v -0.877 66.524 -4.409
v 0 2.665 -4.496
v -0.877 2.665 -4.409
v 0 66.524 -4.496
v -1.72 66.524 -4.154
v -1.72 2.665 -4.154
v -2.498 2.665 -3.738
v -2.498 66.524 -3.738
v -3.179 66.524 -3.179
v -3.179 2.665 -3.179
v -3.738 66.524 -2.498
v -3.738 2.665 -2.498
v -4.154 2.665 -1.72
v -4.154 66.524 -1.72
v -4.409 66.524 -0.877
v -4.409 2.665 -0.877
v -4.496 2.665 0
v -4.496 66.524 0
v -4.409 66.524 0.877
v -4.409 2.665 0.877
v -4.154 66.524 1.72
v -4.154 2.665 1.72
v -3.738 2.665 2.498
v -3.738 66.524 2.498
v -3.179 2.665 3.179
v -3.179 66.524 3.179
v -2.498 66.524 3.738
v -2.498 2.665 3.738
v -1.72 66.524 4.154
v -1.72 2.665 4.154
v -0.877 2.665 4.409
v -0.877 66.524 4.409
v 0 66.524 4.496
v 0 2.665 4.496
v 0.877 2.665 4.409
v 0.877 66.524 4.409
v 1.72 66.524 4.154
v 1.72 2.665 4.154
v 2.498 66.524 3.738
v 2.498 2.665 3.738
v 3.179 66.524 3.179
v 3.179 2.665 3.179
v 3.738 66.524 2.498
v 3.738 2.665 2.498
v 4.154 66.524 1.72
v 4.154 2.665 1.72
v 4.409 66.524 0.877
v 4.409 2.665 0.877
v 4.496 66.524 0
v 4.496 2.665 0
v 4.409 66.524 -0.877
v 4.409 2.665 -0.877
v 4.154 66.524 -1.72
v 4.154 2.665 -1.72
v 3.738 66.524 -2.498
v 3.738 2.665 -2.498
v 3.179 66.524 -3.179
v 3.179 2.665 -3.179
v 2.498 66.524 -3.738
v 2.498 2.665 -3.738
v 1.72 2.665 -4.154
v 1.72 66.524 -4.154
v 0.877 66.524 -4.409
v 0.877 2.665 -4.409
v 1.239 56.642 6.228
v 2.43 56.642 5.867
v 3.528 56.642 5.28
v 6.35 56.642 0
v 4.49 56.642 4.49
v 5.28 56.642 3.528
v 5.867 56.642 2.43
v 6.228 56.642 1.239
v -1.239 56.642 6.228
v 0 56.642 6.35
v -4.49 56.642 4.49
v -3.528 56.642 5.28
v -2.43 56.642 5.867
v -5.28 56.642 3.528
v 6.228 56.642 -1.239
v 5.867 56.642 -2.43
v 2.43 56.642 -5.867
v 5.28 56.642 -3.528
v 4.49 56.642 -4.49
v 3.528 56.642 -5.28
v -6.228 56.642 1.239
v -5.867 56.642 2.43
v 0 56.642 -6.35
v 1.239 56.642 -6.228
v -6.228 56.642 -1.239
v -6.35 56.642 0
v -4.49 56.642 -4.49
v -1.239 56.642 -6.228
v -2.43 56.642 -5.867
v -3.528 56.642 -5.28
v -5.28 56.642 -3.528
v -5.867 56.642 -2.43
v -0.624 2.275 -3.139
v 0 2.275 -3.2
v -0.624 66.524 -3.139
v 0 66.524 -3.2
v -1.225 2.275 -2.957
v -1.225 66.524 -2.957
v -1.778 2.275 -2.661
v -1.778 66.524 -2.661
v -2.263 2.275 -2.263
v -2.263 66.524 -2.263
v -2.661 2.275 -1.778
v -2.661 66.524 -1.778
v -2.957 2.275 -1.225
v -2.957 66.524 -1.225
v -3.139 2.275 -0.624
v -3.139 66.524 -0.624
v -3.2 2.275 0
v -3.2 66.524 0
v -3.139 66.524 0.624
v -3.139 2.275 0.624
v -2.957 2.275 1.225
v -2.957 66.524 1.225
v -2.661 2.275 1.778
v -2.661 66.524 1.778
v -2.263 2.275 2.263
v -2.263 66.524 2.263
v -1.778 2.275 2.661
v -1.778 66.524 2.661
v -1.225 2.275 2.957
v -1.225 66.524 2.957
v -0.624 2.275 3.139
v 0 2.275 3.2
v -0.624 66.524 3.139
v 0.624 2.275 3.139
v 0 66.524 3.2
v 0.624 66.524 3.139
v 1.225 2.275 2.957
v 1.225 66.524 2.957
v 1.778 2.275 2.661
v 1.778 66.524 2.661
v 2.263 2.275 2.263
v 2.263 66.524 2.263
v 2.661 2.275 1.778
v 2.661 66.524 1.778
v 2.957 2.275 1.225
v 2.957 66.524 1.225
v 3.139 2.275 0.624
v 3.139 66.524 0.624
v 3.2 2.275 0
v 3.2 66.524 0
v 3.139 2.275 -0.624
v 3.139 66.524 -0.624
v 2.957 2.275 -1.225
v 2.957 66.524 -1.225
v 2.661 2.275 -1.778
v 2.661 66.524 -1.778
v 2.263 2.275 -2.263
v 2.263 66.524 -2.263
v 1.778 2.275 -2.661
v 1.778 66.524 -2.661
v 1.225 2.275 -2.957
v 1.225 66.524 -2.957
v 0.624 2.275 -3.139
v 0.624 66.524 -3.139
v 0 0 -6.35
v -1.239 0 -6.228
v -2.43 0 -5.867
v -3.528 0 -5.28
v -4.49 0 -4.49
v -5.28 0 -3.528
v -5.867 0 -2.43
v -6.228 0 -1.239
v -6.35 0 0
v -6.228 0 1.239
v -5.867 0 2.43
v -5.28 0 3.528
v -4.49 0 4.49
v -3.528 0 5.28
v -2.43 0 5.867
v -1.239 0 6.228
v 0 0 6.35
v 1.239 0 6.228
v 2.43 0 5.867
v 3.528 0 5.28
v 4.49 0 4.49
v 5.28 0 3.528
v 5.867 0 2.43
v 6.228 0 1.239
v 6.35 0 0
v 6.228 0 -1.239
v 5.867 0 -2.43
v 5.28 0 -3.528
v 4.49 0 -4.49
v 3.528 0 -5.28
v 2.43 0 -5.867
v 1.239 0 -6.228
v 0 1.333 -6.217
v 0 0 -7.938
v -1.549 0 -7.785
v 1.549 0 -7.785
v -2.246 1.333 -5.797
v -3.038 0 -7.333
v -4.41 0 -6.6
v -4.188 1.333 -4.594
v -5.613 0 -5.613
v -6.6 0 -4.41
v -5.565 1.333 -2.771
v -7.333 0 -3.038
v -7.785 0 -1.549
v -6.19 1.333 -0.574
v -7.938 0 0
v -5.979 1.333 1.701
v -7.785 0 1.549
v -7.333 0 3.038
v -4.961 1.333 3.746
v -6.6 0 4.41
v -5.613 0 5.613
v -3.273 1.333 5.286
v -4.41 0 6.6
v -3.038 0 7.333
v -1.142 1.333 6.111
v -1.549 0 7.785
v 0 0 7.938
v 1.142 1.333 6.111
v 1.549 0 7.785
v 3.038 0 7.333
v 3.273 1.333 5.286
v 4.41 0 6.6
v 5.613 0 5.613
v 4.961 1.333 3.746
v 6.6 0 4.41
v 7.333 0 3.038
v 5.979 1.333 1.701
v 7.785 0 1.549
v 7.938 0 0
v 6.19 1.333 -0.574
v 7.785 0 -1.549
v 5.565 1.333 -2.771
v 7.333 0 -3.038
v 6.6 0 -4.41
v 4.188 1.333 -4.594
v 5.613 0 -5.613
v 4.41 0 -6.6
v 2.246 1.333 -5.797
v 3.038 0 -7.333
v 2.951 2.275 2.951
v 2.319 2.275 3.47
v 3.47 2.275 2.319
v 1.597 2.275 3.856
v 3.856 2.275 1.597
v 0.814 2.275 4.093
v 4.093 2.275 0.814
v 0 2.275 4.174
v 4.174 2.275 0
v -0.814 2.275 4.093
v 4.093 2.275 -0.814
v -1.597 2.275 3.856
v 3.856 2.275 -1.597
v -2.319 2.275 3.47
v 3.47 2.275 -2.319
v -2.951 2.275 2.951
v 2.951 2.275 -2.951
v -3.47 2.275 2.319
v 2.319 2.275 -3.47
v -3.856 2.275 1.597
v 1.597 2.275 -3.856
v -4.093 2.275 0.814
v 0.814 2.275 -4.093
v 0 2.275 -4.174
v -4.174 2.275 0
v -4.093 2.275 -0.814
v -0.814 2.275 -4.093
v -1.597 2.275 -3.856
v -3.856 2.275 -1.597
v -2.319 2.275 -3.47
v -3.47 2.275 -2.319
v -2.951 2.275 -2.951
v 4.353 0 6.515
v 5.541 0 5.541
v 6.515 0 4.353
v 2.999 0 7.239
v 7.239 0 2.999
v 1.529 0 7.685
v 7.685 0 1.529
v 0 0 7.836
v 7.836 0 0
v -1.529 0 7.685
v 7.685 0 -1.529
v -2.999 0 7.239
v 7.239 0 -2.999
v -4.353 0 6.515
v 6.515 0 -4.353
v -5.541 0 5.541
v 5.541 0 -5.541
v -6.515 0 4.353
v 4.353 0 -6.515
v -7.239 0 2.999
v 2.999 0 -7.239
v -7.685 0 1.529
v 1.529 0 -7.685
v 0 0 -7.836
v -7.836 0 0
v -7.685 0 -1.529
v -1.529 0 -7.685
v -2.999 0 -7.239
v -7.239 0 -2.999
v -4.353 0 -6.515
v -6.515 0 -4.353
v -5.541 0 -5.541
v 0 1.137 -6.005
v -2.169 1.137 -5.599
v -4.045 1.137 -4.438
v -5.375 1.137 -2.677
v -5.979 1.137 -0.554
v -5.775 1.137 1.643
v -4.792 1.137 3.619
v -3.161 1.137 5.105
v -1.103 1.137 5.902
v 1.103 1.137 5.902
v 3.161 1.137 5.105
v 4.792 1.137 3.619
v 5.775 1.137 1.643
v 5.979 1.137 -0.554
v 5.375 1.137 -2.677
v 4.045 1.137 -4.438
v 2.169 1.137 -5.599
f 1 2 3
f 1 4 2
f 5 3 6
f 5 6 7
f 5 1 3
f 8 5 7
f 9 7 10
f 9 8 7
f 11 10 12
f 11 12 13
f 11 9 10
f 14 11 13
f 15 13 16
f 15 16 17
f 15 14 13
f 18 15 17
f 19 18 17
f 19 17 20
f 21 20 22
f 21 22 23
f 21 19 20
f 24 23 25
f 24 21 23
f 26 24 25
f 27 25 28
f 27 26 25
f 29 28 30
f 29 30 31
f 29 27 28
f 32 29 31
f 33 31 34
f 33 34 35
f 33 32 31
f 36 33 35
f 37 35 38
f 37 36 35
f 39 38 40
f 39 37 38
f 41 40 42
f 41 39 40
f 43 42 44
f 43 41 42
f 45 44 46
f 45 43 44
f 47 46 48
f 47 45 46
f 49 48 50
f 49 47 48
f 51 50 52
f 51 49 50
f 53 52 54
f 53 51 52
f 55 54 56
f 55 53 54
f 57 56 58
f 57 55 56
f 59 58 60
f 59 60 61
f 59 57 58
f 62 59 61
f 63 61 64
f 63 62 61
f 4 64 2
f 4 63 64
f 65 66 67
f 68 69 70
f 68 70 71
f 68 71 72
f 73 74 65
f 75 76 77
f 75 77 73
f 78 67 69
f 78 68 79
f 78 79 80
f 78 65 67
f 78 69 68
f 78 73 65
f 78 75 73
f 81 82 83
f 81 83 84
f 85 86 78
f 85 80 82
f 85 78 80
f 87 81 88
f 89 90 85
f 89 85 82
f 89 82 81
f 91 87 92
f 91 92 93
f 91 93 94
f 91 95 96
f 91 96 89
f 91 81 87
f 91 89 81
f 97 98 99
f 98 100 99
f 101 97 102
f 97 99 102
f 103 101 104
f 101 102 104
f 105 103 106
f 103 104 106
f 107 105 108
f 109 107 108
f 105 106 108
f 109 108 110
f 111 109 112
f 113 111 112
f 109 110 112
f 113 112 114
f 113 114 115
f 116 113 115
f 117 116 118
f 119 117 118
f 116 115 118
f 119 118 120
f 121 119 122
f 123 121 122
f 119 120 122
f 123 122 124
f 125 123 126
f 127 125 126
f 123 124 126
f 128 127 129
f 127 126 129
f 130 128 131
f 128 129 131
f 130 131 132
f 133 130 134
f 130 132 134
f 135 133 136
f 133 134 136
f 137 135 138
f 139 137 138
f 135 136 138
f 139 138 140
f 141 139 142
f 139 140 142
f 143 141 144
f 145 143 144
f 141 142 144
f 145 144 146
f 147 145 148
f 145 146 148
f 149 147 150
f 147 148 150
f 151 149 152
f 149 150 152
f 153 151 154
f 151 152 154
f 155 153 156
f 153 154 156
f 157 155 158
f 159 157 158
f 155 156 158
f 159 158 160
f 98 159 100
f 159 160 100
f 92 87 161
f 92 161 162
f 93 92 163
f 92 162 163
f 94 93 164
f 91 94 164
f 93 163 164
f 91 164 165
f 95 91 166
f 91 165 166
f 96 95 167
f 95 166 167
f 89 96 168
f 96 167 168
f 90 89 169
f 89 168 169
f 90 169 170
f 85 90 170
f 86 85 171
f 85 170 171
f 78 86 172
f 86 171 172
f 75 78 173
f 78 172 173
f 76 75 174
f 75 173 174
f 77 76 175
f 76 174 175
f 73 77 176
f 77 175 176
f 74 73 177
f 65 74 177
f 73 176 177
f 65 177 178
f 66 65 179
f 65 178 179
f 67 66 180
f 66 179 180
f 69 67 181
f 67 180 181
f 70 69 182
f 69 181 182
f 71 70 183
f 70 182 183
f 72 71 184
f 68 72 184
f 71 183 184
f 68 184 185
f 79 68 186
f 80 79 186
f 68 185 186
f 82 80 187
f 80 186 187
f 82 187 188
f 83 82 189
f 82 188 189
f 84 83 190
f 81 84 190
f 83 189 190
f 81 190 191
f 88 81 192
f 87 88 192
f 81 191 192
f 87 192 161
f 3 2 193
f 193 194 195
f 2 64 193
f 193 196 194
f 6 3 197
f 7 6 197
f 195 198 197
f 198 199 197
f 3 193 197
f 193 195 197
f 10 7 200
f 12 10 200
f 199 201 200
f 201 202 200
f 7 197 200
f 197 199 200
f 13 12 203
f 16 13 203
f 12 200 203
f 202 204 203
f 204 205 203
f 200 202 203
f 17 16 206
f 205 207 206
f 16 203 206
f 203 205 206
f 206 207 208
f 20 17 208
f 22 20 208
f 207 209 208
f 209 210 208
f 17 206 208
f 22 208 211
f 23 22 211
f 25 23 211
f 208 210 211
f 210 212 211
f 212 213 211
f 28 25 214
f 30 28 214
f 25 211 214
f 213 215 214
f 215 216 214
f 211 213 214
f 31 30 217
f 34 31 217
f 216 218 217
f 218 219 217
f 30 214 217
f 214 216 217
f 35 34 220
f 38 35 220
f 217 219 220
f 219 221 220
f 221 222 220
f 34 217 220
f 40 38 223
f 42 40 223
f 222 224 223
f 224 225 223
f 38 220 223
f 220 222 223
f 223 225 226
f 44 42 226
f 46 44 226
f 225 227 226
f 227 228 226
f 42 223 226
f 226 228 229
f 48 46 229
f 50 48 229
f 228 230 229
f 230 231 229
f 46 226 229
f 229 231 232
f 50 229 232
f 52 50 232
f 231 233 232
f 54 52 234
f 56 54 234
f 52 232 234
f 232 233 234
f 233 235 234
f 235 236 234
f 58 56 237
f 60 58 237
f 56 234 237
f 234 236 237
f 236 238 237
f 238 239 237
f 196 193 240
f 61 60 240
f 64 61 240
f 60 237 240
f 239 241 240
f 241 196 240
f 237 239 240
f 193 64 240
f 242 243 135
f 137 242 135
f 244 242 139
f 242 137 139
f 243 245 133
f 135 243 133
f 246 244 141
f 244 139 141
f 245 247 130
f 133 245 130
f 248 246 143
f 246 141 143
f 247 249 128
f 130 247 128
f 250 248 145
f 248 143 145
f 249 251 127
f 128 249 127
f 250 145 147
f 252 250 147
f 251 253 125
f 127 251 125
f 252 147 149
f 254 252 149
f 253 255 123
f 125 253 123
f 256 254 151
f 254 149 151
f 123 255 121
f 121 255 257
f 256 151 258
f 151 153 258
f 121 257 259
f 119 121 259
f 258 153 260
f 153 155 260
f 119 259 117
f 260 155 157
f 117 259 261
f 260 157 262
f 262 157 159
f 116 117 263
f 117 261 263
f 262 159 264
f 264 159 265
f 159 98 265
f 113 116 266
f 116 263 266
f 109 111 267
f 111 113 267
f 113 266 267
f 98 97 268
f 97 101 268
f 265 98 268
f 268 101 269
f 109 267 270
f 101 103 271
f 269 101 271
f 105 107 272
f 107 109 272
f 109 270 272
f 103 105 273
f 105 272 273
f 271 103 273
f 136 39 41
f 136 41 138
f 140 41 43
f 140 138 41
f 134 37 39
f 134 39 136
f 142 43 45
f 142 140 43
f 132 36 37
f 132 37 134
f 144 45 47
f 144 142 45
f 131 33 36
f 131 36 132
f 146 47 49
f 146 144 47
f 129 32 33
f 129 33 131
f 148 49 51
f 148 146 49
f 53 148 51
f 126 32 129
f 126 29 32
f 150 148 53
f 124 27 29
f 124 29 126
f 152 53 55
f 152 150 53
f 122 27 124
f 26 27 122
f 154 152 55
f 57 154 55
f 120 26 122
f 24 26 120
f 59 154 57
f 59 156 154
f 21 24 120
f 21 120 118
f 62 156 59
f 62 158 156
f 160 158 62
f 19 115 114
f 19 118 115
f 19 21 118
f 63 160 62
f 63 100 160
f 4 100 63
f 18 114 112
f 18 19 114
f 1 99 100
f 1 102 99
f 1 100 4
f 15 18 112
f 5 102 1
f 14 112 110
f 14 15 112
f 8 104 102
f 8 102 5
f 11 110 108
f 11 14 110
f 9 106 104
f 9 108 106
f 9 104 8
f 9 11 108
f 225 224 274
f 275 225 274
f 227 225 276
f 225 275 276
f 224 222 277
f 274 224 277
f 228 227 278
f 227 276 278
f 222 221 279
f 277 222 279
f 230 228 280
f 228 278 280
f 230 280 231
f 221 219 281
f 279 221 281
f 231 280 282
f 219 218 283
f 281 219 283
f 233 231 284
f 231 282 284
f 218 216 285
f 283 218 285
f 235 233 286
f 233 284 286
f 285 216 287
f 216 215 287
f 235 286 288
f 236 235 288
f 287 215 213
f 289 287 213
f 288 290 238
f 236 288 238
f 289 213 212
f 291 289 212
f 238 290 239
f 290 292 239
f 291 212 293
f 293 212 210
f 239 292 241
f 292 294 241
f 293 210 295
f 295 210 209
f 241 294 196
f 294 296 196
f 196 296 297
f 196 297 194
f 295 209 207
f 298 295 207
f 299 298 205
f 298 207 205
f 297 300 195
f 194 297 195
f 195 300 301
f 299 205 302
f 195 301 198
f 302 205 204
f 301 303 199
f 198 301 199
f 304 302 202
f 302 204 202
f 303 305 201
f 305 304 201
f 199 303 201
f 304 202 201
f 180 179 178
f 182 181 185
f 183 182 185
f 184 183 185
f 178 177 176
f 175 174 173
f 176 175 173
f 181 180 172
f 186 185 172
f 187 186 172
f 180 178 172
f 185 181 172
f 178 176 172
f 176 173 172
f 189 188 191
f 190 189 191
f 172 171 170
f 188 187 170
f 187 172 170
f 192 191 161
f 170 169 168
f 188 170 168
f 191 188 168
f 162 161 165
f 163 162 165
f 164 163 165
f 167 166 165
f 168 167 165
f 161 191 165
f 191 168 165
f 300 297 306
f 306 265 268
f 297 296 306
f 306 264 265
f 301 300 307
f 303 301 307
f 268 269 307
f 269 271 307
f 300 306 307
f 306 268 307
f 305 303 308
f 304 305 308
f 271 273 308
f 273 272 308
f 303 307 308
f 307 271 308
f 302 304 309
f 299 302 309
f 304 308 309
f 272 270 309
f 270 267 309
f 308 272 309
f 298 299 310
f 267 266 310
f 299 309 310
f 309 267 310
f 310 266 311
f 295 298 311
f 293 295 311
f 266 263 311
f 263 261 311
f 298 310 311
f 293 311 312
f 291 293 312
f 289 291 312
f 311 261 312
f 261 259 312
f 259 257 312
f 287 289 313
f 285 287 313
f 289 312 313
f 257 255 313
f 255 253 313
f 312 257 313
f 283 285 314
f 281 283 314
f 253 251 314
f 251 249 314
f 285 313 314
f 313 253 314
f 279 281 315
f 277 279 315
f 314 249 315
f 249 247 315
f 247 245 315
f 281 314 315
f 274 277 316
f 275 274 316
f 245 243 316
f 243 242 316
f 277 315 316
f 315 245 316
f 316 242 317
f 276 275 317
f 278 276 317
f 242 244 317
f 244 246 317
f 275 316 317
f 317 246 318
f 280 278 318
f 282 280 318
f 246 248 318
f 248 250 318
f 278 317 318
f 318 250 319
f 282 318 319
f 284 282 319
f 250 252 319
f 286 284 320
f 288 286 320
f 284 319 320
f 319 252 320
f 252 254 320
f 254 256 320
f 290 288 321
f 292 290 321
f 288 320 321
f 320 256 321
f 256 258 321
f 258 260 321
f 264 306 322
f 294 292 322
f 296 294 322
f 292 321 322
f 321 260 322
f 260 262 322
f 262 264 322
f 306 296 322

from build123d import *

# Parameters (mm, degrees)
SKETCH1_R           = 6.35
BOSS_EXTRUDE1_DEPTH = 56.642
SKETCH2_W           = 1.2954
SKETCH2_H           = 63.858872161


with BuildPart() as part:
    # Sketch1 → Boss-Extrude1 (new body)
    with BuildSketch(Plane(origin=(0, 0, 0), x_dir=(1, 0, 0), z_dir=(0, 1, 0))):
        with Locations(Location((0, 0, 0), (0, 0, 90))):
            Circle(SKETCH1_R)
    extrude(amount=BOSS_EXTRUDE1_DEPTH)


with BuildPart() as body_2:
    # Sketch2 → Revolve1 (revolve)
    with BuildSketch(Plane(origin=(0, 0, 0), x_dir=(0, 0, -1), z_dir=(1, 0, 0)), mode=Mode.PRIVATE) as revolve1_sk:
        with Locations((-3.8481, 34.59446107)):
            Rectangle(SKETCH2_W, SKETCH2_H)
        Polygon((-4.173535709, 2.274896933), (-3.2004, 2.274896933), (-3.2004, 2.665024989), (-4.4958, 2.665024989), (-7.9375, 0), (-7.8359, 0), align=None)
    revolve(revolve1_sk.sketch.rotate(Axis((0, 0, 0), (0, 1, 0)), 180), axis=Axis((0, 0, 0), (0, 1, 0)))


solid = Compound([part.part, body_2.part])
